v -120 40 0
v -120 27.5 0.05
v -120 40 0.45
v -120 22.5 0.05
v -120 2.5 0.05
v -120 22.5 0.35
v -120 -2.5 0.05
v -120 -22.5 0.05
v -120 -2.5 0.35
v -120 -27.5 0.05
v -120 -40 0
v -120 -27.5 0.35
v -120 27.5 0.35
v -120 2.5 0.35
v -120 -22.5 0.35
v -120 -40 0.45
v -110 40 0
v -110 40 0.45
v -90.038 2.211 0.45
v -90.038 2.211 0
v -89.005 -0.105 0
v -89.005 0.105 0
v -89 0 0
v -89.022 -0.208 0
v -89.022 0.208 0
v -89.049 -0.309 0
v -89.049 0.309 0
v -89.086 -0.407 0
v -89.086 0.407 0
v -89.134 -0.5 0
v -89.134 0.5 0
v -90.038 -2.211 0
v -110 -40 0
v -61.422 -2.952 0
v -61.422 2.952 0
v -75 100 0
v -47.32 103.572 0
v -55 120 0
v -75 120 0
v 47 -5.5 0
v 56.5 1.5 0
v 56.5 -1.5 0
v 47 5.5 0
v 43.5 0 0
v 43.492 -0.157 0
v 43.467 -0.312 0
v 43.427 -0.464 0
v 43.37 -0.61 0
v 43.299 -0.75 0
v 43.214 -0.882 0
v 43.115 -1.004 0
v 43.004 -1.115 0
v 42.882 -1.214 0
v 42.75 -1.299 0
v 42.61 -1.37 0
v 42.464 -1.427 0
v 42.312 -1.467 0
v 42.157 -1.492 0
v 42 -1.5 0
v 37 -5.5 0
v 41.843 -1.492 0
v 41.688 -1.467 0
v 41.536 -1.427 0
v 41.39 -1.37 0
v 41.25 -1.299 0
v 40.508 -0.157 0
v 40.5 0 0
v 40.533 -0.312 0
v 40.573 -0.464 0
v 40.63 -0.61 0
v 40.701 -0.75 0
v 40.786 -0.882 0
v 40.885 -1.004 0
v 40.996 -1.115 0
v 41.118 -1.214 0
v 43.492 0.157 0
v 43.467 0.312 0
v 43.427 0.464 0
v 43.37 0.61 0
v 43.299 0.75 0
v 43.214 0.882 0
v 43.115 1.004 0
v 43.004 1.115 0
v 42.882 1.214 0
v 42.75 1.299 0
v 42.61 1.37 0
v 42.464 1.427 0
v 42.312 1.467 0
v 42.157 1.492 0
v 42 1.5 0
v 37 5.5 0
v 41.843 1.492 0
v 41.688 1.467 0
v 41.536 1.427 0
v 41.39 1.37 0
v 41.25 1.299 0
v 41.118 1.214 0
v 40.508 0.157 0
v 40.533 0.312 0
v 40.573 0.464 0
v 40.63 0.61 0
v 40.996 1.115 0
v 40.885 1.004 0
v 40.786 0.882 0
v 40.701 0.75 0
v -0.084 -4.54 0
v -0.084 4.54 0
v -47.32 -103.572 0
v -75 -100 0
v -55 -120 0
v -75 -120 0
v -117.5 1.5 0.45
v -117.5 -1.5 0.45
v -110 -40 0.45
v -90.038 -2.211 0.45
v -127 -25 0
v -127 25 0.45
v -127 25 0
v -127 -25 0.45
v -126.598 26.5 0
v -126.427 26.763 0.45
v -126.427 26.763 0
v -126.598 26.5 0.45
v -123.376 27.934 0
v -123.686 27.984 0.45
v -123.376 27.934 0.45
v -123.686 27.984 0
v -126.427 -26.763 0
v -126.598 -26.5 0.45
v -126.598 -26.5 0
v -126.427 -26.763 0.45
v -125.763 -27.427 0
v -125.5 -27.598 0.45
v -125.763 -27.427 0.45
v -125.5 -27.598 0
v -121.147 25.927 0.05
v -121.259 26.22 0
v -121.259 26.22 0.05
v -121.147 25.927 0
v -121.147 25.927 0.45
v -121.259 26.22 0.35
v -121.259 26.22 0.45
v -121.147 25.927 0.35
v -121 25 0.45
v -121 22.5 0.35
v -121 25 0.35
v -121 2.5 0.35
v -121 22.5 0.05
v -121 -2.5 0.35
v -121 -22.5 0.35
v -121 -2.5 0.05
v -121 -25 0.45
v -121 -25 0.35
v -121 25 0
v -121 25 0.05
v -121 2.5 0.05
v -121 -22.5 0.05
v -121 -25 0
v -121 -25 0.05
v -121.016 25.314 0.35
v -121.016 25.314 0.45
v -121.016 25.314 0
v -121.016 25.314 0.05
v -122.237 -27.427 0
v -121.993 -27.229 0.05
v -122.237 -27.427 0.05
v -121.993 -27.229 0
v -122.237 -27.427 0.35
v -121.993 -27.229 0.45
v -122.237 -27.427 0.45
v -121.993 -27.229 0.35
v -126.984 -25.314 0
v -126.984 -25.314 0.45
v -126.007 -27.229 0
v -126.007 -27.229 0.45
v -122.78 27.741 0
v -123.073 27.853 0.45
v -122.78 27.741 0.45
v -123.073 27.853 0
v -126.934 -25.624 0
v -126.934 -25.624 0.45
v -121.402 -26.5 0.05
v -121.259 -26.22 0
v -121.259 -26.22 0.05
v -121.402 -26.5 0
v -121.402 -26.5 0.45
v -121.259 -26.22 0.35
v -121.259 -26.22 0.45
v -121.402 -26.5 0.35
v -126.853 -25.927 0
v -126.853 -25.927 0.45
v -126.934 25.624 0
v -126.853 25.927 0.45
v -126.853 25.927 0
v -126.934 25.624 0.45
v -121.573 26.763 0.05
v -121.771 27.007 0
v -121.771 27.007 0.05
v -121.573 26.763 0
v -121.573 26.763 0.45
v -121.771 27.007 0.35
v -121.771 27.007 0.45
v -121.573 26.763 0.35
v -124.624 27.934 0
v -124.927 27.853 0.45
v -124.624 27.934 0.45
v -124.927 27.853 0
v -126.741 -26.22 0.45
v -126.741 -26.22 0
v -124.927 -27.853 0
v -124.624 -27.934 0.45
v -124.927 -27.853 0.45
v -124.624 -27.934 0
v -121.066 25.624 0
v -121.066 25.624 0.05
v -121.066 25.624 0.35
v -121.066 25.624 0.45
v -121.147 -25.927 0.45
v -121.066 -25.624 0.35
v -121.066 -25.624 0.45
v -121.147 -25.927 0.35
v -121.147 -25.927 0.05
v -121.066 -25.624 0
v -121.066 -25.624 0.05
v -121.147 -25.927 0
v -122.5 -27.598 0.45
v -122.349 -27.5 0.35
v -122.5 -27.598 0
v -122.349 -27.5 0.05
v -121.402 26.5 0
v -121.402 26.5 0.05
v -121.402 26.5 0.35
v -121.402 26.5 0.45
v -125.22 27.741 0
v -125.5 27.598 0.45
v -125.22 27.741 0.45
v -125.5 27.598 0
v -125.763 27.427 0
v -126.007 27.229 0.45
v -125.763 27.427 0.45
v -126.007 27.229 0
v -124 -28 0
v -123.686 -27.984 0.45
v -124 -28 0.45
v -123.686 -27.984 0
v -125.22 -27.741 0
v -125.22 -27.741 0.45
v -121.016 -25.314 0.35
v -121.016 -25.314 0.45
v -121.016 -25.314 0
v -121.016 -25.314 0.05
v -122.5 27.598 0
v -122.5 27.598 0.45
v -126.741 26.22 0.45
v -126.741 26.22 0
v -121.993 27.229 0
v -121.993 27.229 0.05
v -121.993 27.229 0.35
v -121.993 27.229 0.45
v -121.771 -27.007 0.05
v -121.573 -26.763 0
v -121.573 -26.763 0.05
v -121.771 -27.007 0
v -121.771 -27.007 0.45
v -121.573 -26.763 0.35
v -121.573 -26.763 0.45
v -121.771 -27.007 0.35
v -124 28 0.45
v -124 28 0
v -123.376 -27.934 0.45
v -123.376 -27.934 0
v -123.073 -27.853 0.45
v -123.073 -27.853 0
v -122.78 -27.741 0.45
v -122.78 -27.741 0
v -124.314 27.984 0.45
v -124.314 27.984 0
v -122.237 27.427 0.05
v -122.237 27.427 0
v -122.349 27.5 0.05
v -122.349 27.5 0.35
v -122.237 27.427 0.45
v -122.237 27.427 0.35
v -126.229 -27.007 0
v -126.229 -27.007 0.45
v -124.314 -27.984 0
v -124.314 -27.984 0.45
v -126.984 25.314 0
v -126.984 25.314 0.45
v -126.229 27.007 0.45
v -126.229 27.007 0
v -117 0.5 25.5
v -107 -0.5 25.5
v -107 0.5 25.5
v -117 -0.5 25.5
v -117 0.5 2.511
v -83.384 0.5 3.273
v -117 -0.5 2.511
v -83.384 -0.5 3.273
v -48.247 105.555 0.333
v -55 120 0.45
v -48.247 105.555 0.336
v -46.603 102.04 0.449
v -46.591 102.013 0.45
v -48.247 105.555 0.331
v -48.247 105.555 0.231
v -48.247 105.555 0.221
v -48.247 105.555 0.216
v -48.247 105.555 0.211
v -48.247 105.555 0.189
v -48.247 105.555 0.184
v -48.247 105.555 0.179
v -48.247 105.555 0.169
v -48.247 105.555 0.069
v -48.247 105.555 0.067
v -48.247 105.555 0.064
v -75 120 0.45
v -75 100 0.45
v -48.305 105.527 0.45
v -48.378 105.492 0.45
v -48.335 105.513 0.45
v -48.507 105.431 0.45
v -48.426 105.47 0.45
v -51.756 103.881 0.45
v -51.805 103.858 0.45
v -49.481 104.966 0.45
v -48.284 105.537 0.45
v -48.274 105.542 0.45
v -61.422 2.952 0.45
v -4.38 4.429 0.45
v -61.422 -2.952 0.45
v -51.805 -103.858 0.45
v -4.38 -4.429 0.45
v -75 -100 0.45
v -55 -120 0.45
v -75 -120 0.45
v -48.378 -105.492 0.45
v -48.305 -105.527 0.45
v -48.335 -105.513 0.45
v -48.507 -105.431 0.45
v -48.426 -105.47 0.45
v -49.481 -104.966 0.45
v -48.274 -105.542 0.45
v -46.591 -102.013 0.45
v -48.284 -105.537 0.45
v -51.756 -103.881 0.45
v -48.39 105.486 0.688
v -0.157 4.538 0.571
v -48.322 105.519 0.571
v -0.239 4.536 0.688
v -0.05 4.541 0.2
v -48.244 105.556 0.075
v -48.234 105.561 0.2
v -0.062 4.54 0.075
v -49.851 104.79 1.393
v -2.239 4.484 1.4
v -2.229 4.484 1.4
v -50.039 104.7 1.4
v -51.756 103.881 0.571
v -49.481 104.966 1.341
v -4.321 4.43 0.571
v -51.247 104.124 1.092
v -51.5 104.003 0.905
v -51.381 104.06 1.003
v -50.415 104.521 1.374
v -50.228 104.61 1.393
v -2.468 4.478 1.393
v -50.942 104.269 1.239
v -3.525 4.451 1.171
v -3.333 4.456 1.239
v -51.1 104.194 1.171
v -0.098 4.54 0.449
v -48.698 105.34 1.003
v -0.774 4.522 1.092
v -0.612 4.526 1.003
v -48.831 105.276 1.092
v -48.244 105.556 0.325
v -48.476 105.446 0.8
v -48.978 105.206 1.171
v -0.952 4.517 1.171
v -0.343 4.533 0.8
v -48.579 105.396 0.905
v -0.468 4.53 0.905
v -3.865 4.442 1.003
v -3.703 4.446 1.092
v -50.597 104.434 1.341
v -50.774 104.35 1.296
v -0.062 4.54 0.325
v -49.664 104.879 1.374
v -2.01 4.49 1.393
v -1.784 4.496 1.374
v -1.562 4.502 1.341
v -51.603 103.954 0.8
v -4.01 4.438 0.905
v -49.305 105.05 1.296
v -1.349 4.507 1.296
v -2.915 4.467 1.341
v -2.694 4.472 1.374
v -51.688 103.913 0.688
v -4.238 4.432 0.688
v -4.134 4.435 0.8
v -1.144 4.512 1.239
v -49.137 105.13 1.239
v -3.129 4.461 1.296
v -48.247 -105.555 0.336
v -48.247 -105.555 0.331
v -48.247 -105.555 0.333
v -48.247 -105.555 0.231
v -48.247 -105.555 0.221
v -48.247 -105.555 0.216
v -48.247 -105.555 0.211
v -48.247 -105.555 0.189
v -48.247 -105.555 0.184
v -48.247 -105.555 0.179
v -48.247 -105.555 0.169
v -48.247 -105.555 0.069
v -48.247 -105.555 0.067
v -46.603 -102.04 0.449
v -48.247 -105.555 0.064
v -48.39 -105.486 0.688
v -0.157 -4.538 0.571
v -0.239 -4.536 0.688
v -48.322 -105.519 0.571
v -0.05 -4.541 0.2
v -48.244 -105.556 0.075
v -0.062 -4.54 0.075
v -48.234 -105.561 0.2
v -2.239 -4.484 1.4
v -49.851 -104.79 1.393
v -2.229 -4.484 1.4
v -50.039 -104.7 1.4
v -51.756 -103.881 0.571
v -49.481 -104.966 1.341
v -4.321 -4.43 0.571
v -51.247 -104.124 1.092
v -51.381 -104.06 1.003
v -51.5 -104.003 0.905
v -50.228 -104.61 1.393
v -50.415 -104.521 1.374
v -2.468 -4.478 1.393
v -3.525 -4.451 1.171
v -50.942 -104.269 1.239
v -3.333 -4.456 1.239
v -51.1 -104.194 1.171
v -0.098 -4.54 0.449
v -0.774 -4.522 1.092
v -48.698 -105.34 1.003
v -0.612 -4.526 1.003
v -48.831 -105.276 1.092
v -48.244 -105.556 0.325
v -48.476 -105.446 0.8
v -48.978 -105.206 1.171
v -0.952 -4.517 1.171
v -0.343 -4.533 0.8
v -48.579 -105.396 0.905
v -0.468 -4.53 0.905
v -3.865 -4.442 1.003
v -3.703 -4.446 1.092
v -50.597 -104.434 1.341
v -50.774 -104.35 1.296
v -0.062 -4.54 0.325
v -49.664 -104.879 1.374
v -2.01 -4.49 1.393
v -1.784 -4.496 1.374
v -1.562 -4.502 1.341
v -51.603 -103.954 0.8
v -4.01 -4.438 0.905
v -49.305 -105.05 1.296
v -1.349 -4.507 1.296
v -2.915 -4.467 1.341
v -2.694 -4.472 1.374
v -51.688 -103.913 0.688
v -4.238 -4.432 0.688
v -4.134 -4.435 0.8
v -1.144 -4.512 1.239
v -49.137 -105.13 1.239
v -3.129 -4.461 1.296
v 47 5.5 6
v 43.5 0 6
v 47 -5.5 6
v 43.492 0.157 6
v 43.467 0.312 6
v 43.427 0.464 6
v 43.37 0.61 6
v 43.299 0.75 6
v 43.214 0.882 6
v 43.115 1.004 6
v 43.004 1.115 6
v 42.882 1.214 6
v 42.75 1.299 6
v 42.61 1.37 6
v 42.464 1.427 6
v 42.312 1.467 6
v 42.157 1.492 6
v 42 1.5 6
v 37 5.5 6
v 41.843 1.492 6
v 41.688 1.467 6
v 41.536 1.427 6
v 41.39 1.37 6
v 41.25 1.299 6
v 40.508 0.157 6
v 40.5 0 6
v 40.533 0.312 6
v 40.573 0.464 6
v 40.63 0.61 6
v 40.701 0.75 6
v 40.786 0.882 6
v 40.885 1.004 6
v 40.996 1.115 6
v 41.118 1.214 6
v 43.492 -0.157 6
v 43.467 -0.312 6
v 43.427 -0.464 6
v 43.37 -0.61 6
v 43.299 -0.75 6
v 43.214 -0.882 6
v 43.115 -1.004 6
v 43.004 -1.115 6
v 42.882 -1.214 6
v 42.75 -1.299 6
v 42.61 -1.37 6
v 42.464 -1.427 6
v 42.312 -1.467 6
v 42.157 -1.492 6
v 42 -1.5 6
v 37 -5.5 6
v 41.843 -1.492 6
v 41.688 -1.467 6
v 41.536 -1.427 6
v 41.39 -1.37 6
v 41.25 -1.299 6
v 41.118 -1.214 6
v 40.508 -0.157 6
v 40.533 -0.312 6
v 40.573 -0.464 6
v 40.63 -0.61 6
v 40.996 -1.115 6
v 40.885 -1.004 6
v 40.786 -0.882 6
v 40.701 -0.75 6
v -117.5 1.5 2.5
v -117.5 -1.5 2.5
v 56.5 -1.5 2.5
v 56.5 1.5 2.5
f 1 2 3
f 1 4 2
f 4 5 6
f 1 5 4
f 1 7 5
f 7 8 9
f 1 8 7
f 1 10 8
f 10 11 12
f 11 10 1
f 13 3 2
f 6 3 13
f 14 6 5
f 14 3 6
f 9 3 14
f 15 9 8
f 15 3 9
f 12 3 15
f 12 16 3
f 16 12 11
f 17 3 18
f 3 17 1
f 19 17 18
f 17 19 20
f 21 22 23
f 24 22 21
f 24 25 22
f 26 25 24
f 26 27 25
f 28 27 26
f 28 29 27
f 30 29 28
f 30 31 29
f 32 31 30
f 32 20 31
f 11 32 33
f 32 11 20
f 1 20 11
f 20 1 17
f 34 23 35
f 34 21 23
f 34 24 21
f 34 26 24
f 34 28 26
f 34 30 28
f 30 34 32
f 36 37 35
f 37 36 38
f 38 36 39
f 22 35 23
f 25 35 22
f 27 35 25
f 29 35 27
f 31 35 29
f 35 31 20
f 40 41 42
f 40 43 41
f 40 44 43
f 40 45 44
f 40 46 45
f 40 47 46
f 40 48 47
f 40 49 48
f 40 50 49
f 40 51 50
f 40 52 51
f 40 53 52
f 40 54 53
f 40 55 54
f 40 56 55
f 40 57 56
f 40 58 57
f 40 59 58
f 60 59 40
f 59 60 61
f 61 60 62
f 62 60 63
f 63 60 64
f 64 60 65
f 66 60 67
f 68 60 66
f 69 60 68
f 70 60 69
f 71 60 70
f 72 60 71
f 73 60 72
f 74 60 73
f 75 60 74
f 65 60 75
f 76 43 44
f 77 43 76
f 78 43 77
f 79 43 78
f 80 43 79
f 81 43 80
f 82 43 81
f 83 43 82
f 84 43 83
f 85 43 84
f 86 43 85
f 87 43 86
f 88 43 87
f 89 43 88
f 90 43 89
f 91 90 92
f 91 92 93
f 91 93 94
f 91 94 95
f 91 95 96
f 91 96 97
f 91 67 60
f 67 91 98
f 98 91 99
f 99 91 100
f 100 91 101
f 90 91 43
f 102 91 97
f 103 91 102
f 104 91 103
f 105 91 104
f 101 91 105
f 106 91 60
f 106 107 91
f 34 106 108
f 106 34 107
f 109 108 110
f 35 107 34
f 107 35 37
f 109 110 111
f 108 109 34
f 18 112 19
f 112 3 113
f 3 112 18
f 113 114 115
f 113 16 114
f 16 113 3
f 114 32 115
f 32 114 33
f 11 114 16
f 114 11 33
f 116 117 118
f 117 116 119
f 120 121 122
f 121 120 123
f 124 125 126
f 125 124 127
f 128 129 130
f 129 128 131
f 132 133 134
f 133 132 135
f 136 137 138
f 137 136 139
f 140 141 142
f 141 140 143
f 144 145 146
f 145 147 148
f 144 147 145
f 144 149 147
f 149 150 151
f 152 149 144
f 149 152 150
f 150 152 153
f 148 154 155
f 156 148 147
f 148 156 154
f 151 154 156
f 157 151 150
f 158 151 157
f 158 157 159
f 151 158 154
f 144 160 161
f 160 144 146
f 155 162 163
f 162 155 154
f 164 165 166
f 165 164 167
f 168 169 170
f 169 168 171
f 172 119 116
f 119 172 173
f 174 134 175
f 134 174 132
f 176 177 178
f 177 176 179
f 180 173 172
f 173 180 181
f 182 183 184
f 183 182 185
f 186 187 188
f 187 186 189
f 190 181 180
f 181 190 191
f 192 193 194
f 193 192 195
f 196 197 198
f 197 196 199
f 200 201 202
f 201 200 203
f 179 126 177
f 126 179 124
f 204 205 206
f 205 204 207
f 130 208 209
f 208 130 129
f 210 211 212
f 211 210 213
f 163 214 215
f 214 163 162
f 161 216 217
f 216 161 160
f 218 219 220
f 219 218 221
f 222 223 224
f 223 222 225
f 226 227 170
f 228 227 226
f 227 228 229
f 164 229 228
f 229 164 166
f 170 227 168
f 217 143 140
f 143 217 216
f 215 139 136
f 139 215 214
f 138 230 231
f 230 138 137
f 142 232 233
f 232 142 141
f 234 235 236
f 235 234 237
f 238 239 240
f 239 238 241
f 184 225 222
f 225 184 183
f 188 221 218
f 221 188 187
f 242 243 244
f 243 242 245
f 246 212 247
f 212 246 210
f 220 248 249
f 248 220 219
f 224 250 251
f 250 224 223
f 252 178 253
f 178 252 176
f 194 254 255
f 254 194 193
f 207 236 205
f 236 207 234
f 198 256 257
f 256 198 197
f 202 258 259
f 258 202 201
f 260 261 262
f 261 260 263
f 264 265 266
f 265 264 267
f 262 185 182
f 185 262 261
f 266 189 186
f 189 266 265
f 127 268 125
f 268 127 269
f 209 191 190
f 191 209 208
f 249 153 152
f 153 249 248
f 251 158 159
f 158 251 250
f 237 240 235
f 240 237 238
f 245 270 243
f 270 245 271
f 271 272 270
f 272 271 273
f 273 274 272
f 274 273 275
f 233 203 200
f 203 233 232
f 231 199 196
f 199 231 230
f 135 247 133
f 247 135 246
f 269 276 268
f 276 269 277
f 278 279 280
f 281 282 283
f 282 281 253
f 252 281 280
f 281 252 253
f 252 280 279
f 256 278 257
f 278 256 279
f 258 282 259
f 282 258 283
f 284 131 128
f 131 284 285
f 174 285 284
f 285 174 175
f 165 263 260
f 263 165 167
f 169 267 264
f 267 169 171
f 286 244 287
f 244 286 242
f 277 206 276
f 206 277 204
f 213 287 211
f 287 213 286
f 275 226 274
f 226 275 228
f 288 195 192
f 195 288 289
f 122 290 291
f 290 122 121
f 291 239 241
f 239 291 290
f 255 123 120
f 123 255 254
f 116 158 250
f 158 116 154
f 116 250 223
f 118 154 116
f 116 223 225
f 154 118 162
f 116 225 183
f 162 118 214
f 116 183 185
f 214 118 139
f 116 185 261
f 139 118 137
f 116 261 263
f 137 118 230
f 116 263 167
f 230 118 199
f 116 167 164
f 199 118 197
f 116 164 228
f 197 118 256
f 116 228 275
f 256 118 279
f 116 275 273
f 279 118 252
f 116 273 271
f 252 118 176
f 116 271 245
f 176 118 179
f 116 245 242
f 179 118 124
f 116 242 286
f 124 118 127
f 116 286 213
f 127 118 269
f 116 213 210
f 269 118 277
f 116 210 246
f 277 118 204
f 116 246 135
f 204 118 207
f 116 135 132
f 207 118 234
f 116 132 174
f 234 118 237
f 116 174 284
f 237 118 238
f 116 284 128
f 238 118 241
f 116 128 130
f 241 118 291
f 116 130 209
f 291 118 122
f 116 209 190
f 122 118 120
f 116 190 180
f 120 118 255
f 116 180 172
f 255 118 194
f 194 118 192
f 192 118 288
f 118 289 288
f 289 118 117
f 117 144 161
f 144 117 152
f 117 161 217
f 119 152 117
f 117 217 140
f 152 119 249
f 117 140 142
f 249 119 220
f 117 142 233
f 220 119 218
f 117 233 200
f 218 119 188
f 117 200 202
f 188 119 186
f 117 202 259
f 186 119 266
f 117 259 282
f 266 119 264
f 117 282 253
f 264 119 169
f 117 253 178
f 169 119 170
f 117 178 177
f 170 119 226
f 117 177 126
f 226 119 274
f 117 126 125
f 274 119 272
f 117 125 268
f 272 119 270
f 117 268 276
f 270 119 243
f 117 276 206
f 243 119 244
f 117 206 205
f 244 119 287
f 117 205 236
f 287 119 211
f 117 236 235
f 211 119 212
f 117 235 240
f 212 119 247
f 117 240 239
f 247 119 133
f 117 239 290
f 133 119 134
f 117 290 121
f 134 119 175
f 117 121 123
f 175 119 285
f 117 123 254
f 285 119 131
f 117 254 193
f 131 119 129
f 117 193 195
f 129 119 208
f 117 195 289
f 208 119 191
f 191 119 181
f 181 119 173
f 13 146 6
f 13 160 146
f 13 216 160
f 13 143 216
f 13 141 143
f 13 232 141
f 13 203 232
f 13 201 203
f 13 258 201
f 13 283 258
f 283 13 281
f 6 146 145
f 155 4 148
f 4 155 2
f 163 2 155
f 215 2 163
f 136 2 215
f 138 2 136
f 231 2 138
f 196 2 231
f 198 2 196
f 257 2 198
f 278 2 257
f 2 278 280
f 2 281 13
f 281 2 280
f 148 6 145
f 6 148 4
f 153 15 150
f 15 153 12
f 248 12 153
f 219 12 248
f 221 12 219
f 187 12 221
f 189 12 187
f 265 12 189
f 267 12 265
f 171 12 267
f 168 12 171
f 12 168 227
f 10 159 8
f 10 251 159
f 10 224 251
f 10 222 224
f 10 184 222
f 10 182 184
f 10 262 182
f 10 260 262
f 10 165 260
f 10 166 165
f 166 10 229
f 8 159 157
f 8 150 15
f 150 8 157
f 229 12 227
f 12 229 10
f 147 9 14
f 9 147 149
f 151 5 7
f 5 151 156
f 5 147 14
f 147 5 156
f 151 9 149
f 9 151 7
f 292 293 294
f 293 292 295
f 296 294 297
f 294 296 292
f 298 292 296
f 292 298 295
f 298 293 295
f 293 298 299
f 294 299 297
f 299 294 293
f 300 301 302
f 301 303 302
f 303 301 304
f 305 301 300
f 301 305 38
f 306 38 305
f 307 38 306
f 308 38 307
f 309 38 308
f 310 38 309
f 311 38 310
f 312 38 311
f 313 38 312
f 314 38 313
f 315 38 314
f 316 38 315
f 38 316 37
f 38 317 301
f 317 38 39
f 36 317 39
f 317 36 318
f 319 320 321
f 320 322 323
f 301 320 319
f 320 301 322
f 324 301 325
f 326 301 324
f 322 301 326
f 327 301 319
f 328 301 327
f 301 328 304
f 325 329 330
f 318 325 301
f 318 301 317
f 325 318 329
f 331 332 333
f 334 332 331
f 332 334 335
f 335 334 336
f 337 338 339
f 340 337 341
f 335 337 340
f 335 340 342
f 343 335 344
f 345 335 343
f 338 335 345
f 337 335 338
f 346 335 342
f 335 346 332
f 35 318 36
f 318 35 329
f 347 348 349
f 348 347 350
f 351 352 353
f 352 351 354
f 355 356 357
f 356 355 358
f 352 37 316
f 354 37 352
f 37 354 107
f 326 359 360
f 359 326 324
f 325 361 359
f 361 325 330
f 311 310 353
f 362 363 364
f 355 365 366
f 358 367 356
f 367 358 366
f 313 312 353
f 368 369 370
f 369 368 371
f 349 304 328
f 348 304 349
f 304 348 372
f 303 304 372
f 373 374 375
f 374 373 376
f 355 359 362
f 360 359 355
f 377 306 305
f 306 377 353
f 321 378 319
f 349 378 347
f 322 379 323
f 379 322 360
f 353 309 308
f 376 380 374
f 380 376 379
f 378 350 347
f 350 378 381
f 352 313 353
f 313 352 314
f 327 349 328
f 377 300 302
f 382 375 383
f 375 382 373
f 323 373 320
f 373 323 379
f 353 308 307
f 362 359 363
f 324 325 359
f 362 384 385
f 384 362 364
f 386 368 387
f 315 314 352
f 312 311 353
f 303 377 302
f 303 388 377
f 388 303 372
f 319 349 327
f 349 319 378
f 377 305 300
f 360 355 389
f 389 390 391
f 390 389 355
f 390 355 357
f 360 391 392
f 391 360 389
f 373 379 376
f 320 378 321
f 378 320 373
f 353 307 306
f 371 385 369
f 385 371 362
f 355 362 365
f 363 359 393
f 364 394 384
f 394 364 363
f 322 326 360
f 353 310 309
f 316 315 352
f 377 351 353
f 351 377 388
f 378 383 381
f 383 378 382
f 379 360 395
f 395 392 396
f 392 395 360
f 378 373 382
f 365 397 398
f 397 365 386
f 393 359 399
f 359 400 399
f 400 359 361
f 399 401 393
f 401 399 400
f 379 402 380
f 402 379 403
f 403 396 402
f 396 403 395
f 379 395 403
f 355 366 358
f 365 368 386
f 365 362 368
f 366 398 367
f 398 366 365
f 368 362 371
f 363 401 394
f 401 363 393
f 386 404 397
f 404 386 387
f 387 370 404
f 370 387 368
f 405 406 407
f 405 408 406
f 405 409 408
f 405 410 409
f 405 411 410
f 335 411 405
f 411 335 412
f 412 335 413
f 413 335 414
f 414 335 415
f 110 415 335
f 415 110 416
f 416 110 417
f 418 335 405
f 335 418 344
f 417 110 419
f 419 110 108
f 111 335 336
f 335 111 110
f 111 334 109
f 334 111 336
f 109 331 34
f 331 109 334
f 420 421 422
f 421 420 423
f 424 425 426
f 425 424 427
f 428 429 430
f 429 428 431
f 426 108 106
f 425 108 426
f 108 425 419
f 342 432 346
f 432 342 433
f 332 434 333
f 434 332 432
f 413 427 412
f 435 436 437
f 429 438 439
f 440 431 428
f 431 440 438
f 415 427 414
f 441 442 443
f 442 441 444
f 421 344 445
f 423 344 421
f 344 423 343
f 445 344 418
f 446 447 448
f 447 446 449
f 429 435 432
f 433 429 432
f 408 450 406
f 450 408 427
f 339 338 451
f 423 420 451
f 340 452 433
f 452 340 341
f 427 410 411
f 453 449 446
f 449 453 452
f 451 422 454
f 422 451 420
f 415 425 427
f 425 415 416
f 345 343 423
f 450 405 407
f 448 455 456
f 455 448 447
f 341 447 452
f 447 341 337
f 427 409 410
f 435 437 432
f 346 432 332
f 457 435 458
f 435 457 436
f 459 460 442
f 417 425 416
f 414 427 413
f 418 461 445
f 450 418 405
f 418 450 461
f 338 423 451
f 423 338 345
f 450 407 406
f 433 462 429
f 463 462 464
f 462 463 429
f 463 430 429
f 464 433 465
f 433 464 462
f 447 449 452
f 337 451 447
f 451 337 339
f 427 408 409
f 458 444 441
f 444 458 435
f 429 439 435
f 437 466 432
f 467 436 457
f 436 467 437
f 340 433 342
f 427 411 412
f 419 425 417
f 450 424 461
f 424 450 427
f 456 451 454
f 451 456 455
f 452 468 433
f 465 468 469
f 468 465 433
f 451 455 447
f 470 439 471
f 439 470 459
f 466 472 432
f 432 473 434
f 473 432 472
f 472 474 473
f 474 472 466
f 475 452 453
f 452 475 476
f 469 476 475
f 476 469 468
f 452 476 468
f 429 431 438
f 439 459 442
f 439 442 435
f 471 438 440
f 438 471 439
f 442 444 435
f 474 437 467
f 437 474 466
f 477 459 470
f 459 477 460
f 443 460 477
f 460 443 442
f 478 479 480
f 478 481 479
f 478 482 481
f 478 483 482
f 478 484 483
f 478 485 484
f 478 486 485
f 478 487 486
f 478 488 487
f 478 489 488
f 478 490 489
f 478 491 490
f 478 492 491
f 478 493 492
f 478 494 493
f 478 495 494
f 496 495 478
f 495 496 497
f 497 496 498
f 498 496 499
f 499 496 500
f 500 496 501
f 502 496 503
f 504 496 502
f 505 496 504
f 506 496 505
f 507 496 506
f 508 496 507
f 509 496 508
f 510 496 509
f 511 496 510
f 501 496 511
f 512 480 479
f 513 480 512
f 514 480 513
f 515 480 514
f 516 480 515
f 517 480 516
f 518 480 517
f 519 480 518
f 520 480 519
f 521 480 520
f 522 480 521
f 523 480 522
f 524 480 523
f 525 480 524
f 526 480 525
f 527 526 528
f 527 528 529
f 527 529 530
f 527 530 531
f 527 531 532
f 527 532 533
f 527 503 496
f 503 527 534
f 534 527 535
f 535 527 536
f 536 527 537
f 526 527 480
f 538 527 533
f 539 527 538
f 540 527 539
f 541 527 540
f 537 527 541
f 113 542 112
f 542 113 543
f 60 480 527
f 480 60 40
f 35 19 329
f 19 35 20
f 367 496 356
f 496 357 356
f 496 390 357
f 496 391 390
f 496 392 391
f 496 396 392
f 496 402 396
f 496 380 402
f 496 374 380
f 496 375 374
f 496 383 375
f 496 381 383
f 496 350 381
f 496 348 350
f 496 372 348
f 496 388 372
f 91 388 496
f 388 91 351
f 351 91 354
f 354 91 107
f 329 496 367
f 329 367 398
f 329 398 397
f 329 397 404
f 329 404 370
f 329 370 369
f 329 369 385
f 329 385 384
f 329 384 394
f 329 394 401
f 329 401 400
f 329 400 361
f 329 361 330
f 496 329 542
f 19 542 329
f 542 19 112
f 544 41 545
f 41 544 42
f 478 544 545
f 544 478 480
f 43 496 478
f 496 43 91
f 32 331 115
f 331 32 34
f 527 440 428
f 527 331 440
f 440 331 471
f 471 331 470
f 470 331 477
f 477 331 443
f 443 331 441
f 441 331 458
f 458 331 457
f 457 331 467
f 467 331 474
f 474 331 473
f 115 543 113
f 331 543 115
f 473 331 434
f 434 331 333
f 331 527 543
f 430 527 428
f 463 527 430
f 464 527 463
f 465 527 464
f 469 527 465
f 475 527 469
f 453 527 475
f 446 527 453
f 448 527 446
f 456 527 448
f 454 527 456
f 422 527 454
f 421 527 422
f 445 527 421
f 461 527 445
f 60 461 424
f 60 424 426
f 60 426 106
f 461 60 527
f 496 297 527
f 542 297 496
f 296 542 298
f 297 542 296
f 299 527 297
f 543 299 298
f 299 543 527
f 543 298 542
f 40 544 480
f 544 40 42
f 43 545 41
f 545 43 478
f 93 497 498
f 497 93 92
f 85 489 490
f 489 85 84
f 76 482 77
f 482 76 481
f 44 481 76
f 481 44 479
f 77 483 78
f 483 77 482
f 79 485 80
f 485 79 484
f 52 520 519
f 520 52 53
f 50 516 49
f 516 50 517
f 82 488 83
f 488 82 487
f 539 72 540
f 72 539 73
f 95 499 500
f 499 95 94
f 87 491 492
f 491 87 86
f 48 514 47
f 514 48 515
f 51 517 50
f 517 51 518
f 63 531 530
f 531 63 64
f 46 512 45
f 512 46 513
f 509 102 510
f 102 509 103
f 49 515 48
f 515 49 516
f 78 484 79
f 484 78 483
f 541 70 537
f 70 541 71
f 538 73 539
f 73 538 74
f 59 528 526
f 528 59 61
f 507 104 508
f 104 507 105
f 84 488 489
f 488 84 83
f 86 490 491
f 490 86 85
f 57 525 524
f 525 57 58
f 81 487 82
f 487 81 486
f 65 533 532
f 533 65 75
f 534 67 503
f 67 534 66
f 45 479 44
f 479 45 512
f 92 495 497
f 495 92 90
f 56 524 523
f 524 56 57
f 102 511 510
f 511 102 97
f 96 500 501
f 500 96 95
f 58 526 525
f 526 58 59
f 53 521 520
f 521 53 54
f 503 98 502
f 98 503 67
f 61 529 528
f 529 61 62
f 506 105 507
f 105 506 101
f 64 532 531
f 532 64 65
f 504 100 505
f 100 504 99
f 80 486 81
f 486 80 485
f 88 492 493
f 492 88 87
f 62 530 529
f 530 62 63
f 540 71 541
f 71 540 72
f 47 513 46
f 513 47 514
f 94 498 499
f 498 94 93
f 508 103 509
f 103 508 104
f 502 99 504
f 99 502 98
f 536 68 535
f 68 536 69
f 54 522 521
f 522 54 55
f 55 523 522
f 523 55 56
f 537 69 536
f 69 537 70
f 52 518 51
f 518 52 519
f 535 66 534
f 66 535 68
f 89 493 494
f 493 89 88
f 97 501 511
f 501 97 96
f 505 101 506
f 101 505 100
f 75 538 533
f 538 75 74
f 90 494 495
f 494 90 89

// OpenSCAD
/*

Made by Diego Porqueras - Deezmaker (http://deezmaker.com)

The Bukobot Fly was originally made to test out some features of my Bukobot 3D printer and experiment with thin layers. Then I got curious to see if I can actually make it fly..and I did!

Bukobot Information: http://deezmaker.com/bukobot

The default variables are the original values used to make an actual flying glider.

Slicing recommendations with Slic3r:

First Layer Height= 3 (ratio, so first layer is 0.3mm)
Layer Height = 0.1mm
Perimeters (Shells) = 2
Fill = about 20% (Might need to experiment with this to get good balance)
Print Speed = about 40mm (Try to print it at a safe speed, if weird things happen you might need to slow down the feed rate)

If you place the Bukobot Fly on the platform at 45 deg, make sure you match the Fill angle to the direction of the body so the pattern follow the path of flight (more aerodynamic).

See latest instructions at: http://www.thingiverse.com/thing:22268

This program is free software: you can redistribute it and/or modify
    it under the terms of the GNU General Public License as published by
    the Free Software Foundation, either version 3 of the License, or
    (at your option) any later version.

    This program is distributed in the hope that it will be useful,
    but WITHOUT ANY WARRANTY; without even the implied warranty of
    MERCHANTABILITY or FITNESS FOR A PARTICULAR PURPOSE.  See the
    GNU General Public License for more details.

    You should have received a copy of the GNU General Public License
    along with this program.  If not, see <http://www.gnu.org/licenses/>.
*/

$fn= 60; // Smoothness setting

wing_front_thickness = 0.45; // Wing thickness
wing_back_thickness = 0.45; // Tail Thickness
wing_span = 160/2; // half of the wing span actually
wing_rib_angle = 25.5;
nose_distance = 42;
nose_size = 8;

module wing_front_assembly_r() {
    for ( i = [0 , 1 ] ) {
        mirror([0,i,0]) wing_front_r();
    }
}

module wing_front_r() {
    hull() {
		cylinder(r=1,h=wing_front_thickness,center=0);
		translate([-60,wing_span,0])scale([1,2,1])cylinder(r=17,h=wing_front_thickness,center=0);
		translate([-70,0,0])cylinder(r=1,h=wing_front_thickness,center=0);
    }
    translate([-0.1,0,0.2]) rotate([-90,0,wing_rib_angle])
        scale([1,.6,1])cylinder(r=2,h=wing_span*1.45,center=0);
}

module wing_front_assembly_s() {
    for ( i = [0 , 1 ] ) {
        mirror([0,i,0]) wing_front_s();
    }
}

module wing_front_s() {
    hull() {
        cylinder(r=1,h=wing_front_thickness,center=0);
        translate([-wing_span+5,(wing_span + wing_span/4),0])
            cube([wing_span/4,wing_span/4,wing_front_thickness],center=false);
        translate([-60,0,0]) cylinder(r=1,h=wing_front_thickness,center=0);
    }
    //Leading Edge
    translate([-0.1,0,0.2]) rotate([-90,0,wing_rib_angle])
        scale([1,.6,1])cylinder(r=2,h=wing_span*1.45,center=0);
}

module wing_tail_assembly_r() {
    for ( i = [0 , 1 ] ) {
        mirror([0,i,0]) wing_tail_r();
    }
}

module wing_tail_r() {
	hull() {
		cylinder(r=1,h=wing_back_thickness,center=0);
		translate([-30,40,0])cylinder(r=10,h=wing_back_thickness,center=0);
		translate([-30,0,0])cylinder(r=10,h=wing_back_thickness,center=0);
	}
}

module wing_tail_assembly_s() {
    for ( i = [0 , 1 ] ) {
        mirror([0,i,0]) wing_tail_s();
    }
}

module wing_tail_s() {
	hull() {
		translate([-10,0,0])cylinder(r=1,h=wing_back_thickness,center=0);
		translate([-40,30,0])cube([10,10,wing_back_thickness],center=0);
		translate([-40, 0,0])cube([10,10,wing_back_thickness],center=0);
	}
}


// Tail Assembly
translate([-80,0,0]) {
    //Tail
    wing_tail_assembly_s();
    
    //Rudder
    translate([-32,0,0])
    hull() {
        translate([0,0,25])cube([10,1,1],true);
        #translate([10,0,1])cube([30,1,1],true);
        translate([30,0,1])cube([1,1,1],true);
    }

    // Flap
	translate([-44,0,0]){
        hull() {
            translate([0,25,0])cylinder(r=3,h=wing_back_thickness,center=0);
            translate([0,-25,0])cylinder(r=3,h=wing_back_thickness,center=0);
        }
        translate([5,25,.2])cube([10,5,.3],true);
        translate([5,-25,.2])cube([10,5,.3],true);
        translate([5,0,.2])cube([10,5,.3],true);
    }
} // End Tail Assembly - Translate

// Fuselage
difference() {
	union() {
        // Wings
        wing_front_assembly_s();
        // Fuselage Nose and beam
        hull() {
            translate([55,0,1])cube(3,center=true);
            translate([42,0,3])scale([1,1.1,.6])cube(10,center=true);
            translate([-10,0,1])cube(3,center=true);
            translate([-116,0,1])cube(3,center=true);
        }
	} // End Union

    // Remove Hook Hole
	translate([42,0,3])rotate([0,0,0])cylinder(r=1.5,h=25,center=true);

    // Remove Nose and bottom trimmer
	translate([-20,0,-25])cube([200,300,50],true);
	translate([50,0,16])cube([100,50,20],true);
}

// Fuselage - Orig
//difference() {
//	union() {
//        // Wings
//        wing_front_assembly_s();
//        // Nose
//        hull() {
//            translate([42,0,2.5])scale([1,1.1,.6])sphere(r=8);
//            translate([-10,0,1])sphere(r=1.5);
//        }
//
//        // Fuselage beam
//        hull() {
//            translate([-10,0,1])sphere(r=1.5);
//            translate([-116,0,1])sphere(r=1.5);
//        }
//	} // End Union
//
//    // Remove Hook Hole
//	translate([38,0,3])rotate([0,15,0])cylinder(r=1.5,h=25,center=true);
//
//    // Remove Nose and bottom trimmer
//	translate([-20,0,-25])cube([200,300,50],true);
//	translate([50,0,16])cube([100,50,20],true);
//}
